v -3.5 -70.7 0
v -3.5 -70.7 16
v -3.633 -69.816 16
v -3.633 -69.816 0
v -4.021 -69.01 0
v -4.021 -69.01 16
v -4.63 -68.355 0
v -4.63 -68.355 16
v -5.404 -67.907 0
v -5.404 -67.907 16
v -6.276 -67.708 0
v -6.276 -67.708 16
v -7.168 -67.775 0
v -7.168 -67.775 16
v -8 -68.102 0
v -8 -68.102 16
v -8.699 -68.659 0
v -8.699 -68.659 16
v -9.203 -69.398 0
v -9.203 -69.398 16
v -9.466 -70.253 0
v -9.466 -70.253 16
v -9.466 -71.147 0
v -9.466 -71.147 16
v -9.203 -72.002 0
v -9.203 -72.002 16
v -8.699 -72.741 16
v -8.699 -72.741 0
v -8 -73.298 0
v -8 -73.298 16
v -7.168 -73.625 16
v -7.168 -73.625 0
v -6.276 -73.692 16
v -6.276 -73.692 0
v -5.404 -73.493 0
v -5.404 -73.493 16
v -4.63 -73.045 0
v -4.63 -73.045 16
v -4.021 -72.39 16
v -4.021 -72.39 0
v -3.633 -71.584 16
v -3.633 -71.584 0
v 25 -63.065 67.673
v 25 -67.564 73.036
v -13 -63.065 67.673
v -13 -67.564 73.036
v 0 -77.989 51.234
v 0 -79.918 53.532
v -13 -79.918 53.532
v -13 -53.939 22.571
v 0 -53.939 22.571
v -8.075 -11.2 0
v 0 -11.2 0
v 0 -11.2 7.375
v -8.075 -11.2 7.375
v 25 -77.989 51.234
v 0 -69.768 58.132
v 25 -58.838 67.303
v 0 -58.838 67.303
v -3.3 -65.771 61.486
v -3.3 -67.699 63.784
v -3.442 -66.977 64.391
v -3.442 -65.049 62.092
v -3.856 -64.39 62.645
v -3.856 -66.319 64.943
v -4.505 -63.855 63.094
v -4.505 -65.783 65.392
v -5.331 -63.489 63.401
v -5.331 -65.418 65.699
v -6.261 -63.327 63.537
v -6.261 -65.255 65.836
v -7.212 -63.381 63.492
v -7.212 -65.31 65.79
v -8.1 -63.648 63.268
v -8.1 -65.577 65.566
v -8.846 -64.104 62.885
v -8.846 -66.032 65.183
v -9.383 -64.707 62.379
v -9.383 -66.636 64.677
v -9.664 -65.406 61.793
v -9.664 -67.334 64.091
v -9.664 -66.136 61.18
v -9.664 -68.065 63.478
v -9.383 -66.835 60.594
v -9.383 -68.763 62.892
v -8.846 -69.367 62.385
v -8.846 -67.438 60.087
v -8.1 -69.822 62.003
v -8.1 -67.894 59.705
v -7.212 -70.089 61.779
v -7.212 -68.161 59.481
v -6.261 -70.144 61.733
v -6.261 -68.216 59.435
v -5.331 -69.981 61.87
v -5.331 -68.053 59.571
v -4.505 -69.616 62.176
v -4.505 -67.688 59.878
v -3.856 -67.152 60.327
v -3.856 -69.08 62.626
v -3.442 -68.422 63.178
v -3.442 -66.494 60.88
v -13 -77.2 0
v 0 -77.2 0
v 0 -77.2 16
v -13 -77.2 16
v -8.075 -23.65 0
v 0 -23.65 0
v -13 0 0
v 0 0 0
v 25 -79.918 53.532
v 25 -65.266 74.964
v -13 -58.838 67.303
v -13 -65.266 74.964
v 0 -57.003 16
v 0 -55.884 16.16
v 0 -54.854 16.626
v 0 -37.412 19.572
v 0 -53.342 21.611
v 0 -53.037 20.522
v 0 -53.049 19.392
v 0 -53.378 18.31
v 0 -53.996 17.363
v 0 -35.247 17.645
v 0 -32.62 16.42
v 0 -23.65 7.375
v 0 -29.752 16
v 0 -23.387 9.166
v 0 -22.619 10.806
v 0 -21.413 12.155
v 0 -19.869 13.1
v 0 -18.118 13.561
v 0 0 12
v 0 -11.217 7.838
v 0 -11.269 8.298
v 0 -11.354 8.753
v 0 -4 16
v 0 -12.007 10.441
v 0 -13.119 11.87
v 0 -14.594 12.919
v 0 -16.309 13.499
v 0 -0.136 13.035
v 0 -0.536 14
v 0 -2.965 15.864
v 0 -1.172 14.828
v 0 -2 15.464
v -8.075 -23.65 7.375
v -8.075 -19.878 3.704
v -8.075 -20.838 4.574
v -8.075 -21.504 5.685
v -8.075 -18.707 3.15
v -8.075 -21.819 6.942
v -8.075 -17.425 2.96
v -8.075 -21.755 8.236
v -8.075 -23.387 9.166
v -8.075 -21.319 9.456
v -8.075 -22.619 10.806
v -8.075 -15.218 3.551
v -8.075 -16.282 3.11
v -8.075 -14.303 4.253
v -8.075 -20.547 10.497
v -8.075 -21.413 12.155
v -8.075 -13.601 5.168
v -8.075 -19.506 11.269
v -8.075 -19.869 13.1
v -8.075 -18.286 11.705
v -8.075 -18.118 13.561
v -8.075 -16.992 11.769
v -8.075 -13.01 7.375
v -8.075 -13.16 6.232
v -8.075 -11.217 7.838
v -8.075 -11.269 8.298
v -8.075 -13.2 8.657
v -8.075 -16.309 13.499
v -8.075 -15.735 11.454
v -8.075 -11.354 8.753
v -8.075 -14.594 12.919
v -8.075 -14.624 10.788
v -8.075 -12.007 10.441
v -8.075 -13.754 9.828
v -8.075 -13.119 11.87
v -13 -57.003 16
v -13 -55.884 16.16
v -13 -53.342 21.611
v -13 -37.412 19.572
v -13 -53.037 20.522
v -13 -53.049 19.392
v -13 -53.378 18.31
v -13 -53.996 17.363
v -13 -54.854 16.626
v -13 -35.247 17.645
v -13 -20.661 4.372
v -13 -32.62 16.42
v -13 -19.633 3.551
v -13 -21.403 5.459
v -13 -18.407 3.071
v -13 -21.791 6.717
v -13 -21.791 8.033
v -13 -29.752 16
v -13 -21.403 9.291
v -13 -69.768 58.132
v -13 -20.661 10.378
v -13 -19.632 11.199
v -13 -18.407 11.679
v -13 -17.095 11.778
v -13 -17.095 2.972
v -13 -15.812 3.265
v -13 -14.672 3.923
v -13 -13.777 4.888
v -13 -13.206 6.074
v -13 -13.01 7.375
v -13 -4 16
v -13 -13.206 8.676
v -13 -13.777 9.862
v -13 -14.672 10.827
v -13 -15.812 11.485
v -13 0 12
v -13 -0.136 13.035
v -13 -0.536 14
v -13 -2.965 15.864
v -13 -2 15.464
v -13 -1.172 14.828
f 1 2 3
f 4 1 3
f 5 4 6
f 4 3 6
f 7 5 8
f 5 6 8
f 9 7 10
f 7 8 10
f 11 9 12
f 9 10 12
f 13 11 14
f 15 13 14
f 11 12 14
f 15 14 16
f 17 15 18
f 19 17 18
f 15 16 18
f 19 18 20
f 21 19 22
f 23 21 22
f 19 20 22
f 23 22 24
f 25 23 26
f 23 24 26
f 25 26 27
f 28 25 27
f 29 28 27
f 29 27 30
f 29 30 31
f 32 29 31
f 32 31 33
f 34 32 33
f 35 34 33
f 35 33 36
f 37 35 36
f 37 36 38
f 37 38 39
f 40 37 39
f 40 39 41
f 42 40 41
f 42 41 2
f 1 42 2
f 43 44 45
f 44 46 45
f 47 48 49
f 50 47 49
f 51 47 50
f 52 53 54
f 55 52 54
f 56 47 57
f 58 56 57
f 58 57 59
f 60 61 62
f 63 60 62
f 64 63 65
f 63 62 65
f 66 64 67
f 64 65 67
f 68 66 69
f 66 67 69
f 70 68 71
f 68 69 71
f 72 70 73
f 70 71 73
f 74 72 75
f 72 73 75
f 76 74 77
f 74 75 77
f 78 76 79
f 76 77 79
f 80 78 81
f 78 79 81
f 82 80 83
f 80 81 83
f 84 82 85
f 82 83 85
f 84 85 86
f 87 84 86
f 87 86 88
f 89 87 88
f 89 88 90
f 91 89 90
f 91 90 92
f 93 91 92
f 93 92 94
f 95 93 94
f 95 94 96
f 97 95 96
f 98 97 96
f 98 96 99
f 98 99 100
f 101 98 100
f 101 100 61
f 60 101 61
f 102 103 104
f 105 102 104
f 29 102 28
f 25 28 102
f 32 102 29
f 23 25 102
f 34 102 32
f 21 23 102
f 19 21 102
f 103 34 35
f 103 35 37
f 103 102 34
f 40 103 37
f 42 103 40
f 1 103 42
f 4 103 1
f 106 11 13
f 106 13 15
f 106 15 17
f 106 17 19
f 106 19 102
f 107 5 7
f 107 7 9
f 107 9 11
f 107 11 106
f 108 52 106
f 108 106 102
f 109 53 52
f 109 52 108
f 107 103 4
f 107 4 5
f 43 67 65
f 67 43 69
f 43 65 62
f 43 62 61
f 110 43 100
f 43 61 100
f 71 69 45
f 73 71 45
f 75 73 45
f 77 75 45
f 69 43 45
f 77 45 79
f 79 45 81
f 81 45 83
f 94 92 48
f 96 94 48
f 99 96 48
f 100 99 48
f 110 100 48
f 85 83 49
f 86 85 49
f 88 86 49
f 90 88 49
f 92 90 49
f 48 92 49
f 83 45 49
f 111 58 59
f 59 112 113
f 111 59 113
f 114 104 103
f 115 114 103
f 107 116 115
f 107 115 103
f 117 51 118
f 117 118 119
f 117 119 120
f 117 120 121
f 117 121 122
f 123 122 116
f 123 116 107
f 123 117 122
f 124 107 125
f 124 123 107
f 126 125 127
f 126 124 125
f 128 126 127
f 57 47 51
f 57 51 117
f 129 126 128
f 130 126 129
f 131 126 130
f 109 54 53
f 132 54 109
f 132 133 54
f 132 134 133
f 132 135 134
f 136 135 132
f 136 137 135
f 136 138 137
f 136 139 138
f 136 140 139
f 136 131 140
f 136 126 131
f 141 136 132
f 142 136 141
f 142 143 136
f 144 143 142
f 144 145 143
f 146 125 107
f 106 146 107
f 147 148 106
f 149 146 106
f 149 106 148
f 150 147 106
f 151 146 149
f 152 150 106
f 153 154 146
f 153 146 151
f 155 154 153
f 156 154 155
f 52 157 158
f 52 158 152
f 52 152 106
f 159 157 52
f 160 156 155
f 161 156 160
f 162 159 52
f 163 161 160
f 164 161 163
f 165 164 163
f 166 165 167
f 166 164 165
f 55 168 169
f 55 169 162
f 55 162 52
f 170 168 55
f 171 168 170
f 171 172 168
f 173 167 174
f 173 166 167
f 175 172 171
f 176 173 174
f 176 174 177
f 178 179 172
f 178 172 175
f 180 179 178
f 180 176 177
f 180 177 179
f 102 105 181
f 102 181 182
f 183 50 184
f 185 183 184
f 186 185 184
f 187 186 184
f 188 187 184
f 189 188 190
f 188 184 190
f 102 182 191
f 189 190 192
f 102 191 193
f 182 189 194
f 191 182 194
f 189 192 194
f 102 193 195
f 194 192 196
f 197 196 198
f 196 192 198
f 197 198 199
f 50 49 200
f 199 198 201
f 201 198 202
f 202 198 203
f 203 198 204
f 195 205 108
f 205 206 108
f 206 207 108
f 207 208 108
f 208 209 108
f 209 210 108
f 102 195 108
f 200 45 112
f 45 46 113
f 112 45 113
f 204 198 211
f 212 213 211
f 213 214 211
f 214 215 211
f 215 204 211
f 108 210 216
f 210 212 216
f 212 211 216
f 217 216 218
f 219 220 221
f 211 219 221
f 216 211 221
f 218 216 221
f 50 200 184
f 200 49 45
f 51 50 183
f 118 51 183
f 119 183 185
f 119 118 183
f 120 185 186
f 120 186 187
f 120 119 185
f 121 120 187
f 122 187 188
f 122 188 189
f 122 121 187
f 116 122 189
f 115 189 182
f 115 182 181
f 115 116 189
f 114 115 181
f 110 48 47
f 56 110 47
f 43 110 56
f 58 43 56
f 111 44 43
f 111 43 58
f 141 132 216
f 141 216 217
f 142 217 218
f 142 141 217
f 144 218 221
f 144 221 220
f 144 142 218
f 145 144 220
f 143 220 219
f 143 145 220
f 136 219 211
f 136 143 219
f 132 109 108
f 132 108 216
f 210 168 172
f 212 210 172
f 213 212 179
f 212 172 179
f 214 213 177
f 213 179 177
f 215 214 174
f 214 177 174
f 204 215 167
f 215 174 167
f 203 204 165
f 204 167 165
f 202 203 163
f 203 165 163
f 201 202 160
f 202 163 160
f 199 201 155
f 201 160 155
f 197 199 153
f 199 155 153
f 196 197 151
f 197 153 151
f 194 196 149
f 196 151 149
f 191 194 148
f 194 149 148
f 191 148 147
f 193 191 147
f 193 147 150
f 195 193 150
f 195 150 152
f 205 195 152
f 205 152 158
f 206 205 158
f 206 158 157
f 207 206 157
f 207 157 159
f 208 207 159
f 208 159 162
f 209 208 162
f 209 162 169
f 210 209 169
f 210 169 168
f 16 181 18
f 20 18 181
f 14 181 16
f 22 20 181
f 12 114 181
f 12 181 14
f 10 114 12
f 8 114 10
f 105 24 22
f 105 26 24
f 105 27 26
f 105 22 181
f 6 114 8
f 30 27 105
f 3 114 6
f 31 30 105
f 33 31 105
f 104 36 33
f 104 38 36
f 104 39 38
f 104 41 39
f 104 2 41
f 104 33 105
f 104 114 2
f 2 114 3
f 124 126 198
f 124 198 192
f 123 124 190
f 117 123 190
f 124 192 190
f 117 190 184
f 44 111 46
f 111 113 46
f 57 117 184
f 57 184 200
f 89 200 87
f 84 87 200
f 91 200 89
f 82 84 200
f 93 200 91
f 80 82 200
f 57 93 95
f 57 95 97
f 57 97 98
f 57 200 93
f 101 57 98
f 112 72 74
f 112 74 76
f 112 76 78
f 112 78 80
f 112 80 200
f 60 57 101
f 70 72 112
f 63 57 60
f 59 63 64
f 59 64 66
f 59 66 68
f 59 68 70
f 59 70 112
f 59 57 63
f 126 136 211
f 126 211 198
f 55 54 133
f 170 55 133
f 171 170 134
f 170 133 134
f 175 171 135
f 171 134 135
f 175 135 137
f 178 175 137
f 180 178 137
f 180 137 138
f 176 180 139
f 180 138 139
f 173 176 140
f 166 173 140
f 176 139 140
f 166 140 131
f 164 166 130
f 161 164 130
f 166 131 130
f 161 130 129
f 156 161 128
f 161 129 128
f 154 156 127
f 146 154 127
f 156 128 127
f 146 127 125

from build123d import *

# Parameters (mm, degrees)
F0_R      = 4.415
F0_W      = 3.025
F0_H      = 16
F0_W_2    = 7.0735459991
F1_DEPTH  = 13
F3_DEPTH  = 8.075
F4_R      = 10
F5_R      = 3
F6_DEPTH  = 25
F7_R      = 3.2
F8_DEPTH  = 11.1
F10_DEPTH = 25


# Not quite as in the source:
# - ends of sketch curves that miss each other by under 0.0002 mm in the source are joined


with BuildPart() as f1:
    # F0 (on Right) → F1 (new body)
    with BuildSketch(Plane.YZ):
        with BuildLine():
            Line((-11.2, 0), (0, 0))
            Line((0, 0), (0, 12))
            ThreePointArc((0, 12), (-1.1715728753, 14.8284271247), (-4, 16))
            Line((-4, 16), (-34.4146185314, 16))
            Line((-34.4146185314, 16), (-69.7679370642, 58.1324443715))
            Line((-69.7679370642, 58.1324443715), (-58.8383850945, 67.3034273983))
            Line((-58.8383850945, 67.3034273983), (-65.2662611913, 74.9638718294))
            Line((-65.2662611913, 74.9638718294), (-67.5643945207, 73.0355090004))
            Line((-67.5643945207, 73.0355090004), (-63.0648812529, 67.6731978986))
            Line((-63.0648812529, 67.6731978986), (-79.9178590015, 53.5318704855))
            Line((-79.9178590015, 53.5318704855), (-53.9387302293, 22.5711504387))
            ThreePointArc((-53.9387302293, 22.5711504387), (-53.3776768537, 18.309526953), (-57.0029080018, 16))
            Line((-57.0029080018, 16), (-67.1014540009, 16))
            Line((-67.1014540009, 16), (-67.1014540009, 0))
            Line((-67.1014540009, 0), (-64.0764540009, 0))
            Line((-64.0764540009, 0), (-23.65, 0))
            Line((-23.65, 0), (-23.65, 7.375))
            ThreePointArc((-23.65, 7.375), (-21.8267397129, 11.7767397129), (-17.425, 13.6))
            ThreePointArc((-17.425, 13.6), (-13.0232602871, 11.7767397129), (-11.2, 7.375))
            Line((-11.2, 7.375), (-11.2, 0))
        make_face()
        with BuildLine():
            Line((-23.65, 0), (-11.2, 0))
            Line((-11.2, 0), (-11.2, 7.375))
            ThreePointArc((-11.2, 7.375), (-13.0232602871, 11.7767397129), (-17.425, 13.6))
            ThreePointArc((-17.425, 13.6), (-21.8267397129, 11.7767397129), (-23.65, 7.375))
            Line((-23.65, 7.375), (-23.65, 0))
        make_face()
        with Locations((-17.425, 7.375)):
            Circle(F0_R, mode=Mode.SUBTRACT)
        with Locations((-68.6139540009, 8)):
            Rectangle(F0_W, F0_H)
        with Locations((-73.6632270005, 8)):
            Rectangle(F0_W_2, F0_H)
    extrude(amount=-F1_DEPTH)

    # F2 (on face) → F3 (cut)
    with BuildSketch(Plane.YZ):
        with BuildLine():
            Line((-17.425, 0), (-11.2, 0))
            Line((-11.2, 0), (-11.2, 7.3750006942))
            ThreePointArc((-11.2, 7.3750006942), (-11.2387169647, 8.068201392), (-11.3543862514, 8.7527792377))
            ThreePointArc((-11.3543862514, 8.7527792377), (-18.1182010341, 13.5612829976), (-23.65, 7.375))
            Line((-23.65, 7.375), (-23.65, 0))
            Line((-23.65, 0), (-17.425, 0))
        make_face()
        with BuildLine():
            ThreePointArc((-13.01, 7.375), (-14.3031235611, 4.2531235611), (-17.425, 2.96))
            ThreePointArc((-17.425, 2.96), (-20.5468764389, 10.4968764389), (-13.01, 7.375))
        make_face(mode=Mode.SUBTRACT)
    extrude(amount=-F3_DEPTH, mode=Mode.SUBTRACT)

    # F4
    f4_edges = [f1.edges().sort_by_distance(p)[0] for p in [
        (-6.5, -34.414619, 16),
    ]]
    fillet(f4_edges, radius=F4_R)

    # F5 (on face) → F6 (cut)
    with BuildSketch(Plane.XY.offset(16)):
        with Locations((-6.5, -70.7)):
            Circle(F5_R)
    extrude(amount=-F6_DEPTH, mode=Mode.SUBTRACT)

    # F7 (on face) → F8 (cut)
    with BuildSketch(Plane(origin=(0, -59.3794347551, 70.7656546956), x_dir=(1, 0, 0), z_dir=(0, -0.6427876097, 0.7660444431))):
        with Locations((-6.5, -10.8610087227)):
            Circle(F7_R)
    extrude(amount=-F8_DEPTH, mode=Mode.SUBTRACT)

    # F9 (on face) → F10 (join)
    with BuildSketch(Plane.YZ):
        Polygon((-77.9894961724, 51.2337371561), (-58.8383850945, 67.3034273983), (-65.2662611913, 74.9638718294), (-67.5643945207, 73.0355090004), (-63.0648812529, 67.6731978986), (-79.9178590015, 53.5318704855), align=None)
    extrude(amount=F10_DEPTH)


solid = f1.part
